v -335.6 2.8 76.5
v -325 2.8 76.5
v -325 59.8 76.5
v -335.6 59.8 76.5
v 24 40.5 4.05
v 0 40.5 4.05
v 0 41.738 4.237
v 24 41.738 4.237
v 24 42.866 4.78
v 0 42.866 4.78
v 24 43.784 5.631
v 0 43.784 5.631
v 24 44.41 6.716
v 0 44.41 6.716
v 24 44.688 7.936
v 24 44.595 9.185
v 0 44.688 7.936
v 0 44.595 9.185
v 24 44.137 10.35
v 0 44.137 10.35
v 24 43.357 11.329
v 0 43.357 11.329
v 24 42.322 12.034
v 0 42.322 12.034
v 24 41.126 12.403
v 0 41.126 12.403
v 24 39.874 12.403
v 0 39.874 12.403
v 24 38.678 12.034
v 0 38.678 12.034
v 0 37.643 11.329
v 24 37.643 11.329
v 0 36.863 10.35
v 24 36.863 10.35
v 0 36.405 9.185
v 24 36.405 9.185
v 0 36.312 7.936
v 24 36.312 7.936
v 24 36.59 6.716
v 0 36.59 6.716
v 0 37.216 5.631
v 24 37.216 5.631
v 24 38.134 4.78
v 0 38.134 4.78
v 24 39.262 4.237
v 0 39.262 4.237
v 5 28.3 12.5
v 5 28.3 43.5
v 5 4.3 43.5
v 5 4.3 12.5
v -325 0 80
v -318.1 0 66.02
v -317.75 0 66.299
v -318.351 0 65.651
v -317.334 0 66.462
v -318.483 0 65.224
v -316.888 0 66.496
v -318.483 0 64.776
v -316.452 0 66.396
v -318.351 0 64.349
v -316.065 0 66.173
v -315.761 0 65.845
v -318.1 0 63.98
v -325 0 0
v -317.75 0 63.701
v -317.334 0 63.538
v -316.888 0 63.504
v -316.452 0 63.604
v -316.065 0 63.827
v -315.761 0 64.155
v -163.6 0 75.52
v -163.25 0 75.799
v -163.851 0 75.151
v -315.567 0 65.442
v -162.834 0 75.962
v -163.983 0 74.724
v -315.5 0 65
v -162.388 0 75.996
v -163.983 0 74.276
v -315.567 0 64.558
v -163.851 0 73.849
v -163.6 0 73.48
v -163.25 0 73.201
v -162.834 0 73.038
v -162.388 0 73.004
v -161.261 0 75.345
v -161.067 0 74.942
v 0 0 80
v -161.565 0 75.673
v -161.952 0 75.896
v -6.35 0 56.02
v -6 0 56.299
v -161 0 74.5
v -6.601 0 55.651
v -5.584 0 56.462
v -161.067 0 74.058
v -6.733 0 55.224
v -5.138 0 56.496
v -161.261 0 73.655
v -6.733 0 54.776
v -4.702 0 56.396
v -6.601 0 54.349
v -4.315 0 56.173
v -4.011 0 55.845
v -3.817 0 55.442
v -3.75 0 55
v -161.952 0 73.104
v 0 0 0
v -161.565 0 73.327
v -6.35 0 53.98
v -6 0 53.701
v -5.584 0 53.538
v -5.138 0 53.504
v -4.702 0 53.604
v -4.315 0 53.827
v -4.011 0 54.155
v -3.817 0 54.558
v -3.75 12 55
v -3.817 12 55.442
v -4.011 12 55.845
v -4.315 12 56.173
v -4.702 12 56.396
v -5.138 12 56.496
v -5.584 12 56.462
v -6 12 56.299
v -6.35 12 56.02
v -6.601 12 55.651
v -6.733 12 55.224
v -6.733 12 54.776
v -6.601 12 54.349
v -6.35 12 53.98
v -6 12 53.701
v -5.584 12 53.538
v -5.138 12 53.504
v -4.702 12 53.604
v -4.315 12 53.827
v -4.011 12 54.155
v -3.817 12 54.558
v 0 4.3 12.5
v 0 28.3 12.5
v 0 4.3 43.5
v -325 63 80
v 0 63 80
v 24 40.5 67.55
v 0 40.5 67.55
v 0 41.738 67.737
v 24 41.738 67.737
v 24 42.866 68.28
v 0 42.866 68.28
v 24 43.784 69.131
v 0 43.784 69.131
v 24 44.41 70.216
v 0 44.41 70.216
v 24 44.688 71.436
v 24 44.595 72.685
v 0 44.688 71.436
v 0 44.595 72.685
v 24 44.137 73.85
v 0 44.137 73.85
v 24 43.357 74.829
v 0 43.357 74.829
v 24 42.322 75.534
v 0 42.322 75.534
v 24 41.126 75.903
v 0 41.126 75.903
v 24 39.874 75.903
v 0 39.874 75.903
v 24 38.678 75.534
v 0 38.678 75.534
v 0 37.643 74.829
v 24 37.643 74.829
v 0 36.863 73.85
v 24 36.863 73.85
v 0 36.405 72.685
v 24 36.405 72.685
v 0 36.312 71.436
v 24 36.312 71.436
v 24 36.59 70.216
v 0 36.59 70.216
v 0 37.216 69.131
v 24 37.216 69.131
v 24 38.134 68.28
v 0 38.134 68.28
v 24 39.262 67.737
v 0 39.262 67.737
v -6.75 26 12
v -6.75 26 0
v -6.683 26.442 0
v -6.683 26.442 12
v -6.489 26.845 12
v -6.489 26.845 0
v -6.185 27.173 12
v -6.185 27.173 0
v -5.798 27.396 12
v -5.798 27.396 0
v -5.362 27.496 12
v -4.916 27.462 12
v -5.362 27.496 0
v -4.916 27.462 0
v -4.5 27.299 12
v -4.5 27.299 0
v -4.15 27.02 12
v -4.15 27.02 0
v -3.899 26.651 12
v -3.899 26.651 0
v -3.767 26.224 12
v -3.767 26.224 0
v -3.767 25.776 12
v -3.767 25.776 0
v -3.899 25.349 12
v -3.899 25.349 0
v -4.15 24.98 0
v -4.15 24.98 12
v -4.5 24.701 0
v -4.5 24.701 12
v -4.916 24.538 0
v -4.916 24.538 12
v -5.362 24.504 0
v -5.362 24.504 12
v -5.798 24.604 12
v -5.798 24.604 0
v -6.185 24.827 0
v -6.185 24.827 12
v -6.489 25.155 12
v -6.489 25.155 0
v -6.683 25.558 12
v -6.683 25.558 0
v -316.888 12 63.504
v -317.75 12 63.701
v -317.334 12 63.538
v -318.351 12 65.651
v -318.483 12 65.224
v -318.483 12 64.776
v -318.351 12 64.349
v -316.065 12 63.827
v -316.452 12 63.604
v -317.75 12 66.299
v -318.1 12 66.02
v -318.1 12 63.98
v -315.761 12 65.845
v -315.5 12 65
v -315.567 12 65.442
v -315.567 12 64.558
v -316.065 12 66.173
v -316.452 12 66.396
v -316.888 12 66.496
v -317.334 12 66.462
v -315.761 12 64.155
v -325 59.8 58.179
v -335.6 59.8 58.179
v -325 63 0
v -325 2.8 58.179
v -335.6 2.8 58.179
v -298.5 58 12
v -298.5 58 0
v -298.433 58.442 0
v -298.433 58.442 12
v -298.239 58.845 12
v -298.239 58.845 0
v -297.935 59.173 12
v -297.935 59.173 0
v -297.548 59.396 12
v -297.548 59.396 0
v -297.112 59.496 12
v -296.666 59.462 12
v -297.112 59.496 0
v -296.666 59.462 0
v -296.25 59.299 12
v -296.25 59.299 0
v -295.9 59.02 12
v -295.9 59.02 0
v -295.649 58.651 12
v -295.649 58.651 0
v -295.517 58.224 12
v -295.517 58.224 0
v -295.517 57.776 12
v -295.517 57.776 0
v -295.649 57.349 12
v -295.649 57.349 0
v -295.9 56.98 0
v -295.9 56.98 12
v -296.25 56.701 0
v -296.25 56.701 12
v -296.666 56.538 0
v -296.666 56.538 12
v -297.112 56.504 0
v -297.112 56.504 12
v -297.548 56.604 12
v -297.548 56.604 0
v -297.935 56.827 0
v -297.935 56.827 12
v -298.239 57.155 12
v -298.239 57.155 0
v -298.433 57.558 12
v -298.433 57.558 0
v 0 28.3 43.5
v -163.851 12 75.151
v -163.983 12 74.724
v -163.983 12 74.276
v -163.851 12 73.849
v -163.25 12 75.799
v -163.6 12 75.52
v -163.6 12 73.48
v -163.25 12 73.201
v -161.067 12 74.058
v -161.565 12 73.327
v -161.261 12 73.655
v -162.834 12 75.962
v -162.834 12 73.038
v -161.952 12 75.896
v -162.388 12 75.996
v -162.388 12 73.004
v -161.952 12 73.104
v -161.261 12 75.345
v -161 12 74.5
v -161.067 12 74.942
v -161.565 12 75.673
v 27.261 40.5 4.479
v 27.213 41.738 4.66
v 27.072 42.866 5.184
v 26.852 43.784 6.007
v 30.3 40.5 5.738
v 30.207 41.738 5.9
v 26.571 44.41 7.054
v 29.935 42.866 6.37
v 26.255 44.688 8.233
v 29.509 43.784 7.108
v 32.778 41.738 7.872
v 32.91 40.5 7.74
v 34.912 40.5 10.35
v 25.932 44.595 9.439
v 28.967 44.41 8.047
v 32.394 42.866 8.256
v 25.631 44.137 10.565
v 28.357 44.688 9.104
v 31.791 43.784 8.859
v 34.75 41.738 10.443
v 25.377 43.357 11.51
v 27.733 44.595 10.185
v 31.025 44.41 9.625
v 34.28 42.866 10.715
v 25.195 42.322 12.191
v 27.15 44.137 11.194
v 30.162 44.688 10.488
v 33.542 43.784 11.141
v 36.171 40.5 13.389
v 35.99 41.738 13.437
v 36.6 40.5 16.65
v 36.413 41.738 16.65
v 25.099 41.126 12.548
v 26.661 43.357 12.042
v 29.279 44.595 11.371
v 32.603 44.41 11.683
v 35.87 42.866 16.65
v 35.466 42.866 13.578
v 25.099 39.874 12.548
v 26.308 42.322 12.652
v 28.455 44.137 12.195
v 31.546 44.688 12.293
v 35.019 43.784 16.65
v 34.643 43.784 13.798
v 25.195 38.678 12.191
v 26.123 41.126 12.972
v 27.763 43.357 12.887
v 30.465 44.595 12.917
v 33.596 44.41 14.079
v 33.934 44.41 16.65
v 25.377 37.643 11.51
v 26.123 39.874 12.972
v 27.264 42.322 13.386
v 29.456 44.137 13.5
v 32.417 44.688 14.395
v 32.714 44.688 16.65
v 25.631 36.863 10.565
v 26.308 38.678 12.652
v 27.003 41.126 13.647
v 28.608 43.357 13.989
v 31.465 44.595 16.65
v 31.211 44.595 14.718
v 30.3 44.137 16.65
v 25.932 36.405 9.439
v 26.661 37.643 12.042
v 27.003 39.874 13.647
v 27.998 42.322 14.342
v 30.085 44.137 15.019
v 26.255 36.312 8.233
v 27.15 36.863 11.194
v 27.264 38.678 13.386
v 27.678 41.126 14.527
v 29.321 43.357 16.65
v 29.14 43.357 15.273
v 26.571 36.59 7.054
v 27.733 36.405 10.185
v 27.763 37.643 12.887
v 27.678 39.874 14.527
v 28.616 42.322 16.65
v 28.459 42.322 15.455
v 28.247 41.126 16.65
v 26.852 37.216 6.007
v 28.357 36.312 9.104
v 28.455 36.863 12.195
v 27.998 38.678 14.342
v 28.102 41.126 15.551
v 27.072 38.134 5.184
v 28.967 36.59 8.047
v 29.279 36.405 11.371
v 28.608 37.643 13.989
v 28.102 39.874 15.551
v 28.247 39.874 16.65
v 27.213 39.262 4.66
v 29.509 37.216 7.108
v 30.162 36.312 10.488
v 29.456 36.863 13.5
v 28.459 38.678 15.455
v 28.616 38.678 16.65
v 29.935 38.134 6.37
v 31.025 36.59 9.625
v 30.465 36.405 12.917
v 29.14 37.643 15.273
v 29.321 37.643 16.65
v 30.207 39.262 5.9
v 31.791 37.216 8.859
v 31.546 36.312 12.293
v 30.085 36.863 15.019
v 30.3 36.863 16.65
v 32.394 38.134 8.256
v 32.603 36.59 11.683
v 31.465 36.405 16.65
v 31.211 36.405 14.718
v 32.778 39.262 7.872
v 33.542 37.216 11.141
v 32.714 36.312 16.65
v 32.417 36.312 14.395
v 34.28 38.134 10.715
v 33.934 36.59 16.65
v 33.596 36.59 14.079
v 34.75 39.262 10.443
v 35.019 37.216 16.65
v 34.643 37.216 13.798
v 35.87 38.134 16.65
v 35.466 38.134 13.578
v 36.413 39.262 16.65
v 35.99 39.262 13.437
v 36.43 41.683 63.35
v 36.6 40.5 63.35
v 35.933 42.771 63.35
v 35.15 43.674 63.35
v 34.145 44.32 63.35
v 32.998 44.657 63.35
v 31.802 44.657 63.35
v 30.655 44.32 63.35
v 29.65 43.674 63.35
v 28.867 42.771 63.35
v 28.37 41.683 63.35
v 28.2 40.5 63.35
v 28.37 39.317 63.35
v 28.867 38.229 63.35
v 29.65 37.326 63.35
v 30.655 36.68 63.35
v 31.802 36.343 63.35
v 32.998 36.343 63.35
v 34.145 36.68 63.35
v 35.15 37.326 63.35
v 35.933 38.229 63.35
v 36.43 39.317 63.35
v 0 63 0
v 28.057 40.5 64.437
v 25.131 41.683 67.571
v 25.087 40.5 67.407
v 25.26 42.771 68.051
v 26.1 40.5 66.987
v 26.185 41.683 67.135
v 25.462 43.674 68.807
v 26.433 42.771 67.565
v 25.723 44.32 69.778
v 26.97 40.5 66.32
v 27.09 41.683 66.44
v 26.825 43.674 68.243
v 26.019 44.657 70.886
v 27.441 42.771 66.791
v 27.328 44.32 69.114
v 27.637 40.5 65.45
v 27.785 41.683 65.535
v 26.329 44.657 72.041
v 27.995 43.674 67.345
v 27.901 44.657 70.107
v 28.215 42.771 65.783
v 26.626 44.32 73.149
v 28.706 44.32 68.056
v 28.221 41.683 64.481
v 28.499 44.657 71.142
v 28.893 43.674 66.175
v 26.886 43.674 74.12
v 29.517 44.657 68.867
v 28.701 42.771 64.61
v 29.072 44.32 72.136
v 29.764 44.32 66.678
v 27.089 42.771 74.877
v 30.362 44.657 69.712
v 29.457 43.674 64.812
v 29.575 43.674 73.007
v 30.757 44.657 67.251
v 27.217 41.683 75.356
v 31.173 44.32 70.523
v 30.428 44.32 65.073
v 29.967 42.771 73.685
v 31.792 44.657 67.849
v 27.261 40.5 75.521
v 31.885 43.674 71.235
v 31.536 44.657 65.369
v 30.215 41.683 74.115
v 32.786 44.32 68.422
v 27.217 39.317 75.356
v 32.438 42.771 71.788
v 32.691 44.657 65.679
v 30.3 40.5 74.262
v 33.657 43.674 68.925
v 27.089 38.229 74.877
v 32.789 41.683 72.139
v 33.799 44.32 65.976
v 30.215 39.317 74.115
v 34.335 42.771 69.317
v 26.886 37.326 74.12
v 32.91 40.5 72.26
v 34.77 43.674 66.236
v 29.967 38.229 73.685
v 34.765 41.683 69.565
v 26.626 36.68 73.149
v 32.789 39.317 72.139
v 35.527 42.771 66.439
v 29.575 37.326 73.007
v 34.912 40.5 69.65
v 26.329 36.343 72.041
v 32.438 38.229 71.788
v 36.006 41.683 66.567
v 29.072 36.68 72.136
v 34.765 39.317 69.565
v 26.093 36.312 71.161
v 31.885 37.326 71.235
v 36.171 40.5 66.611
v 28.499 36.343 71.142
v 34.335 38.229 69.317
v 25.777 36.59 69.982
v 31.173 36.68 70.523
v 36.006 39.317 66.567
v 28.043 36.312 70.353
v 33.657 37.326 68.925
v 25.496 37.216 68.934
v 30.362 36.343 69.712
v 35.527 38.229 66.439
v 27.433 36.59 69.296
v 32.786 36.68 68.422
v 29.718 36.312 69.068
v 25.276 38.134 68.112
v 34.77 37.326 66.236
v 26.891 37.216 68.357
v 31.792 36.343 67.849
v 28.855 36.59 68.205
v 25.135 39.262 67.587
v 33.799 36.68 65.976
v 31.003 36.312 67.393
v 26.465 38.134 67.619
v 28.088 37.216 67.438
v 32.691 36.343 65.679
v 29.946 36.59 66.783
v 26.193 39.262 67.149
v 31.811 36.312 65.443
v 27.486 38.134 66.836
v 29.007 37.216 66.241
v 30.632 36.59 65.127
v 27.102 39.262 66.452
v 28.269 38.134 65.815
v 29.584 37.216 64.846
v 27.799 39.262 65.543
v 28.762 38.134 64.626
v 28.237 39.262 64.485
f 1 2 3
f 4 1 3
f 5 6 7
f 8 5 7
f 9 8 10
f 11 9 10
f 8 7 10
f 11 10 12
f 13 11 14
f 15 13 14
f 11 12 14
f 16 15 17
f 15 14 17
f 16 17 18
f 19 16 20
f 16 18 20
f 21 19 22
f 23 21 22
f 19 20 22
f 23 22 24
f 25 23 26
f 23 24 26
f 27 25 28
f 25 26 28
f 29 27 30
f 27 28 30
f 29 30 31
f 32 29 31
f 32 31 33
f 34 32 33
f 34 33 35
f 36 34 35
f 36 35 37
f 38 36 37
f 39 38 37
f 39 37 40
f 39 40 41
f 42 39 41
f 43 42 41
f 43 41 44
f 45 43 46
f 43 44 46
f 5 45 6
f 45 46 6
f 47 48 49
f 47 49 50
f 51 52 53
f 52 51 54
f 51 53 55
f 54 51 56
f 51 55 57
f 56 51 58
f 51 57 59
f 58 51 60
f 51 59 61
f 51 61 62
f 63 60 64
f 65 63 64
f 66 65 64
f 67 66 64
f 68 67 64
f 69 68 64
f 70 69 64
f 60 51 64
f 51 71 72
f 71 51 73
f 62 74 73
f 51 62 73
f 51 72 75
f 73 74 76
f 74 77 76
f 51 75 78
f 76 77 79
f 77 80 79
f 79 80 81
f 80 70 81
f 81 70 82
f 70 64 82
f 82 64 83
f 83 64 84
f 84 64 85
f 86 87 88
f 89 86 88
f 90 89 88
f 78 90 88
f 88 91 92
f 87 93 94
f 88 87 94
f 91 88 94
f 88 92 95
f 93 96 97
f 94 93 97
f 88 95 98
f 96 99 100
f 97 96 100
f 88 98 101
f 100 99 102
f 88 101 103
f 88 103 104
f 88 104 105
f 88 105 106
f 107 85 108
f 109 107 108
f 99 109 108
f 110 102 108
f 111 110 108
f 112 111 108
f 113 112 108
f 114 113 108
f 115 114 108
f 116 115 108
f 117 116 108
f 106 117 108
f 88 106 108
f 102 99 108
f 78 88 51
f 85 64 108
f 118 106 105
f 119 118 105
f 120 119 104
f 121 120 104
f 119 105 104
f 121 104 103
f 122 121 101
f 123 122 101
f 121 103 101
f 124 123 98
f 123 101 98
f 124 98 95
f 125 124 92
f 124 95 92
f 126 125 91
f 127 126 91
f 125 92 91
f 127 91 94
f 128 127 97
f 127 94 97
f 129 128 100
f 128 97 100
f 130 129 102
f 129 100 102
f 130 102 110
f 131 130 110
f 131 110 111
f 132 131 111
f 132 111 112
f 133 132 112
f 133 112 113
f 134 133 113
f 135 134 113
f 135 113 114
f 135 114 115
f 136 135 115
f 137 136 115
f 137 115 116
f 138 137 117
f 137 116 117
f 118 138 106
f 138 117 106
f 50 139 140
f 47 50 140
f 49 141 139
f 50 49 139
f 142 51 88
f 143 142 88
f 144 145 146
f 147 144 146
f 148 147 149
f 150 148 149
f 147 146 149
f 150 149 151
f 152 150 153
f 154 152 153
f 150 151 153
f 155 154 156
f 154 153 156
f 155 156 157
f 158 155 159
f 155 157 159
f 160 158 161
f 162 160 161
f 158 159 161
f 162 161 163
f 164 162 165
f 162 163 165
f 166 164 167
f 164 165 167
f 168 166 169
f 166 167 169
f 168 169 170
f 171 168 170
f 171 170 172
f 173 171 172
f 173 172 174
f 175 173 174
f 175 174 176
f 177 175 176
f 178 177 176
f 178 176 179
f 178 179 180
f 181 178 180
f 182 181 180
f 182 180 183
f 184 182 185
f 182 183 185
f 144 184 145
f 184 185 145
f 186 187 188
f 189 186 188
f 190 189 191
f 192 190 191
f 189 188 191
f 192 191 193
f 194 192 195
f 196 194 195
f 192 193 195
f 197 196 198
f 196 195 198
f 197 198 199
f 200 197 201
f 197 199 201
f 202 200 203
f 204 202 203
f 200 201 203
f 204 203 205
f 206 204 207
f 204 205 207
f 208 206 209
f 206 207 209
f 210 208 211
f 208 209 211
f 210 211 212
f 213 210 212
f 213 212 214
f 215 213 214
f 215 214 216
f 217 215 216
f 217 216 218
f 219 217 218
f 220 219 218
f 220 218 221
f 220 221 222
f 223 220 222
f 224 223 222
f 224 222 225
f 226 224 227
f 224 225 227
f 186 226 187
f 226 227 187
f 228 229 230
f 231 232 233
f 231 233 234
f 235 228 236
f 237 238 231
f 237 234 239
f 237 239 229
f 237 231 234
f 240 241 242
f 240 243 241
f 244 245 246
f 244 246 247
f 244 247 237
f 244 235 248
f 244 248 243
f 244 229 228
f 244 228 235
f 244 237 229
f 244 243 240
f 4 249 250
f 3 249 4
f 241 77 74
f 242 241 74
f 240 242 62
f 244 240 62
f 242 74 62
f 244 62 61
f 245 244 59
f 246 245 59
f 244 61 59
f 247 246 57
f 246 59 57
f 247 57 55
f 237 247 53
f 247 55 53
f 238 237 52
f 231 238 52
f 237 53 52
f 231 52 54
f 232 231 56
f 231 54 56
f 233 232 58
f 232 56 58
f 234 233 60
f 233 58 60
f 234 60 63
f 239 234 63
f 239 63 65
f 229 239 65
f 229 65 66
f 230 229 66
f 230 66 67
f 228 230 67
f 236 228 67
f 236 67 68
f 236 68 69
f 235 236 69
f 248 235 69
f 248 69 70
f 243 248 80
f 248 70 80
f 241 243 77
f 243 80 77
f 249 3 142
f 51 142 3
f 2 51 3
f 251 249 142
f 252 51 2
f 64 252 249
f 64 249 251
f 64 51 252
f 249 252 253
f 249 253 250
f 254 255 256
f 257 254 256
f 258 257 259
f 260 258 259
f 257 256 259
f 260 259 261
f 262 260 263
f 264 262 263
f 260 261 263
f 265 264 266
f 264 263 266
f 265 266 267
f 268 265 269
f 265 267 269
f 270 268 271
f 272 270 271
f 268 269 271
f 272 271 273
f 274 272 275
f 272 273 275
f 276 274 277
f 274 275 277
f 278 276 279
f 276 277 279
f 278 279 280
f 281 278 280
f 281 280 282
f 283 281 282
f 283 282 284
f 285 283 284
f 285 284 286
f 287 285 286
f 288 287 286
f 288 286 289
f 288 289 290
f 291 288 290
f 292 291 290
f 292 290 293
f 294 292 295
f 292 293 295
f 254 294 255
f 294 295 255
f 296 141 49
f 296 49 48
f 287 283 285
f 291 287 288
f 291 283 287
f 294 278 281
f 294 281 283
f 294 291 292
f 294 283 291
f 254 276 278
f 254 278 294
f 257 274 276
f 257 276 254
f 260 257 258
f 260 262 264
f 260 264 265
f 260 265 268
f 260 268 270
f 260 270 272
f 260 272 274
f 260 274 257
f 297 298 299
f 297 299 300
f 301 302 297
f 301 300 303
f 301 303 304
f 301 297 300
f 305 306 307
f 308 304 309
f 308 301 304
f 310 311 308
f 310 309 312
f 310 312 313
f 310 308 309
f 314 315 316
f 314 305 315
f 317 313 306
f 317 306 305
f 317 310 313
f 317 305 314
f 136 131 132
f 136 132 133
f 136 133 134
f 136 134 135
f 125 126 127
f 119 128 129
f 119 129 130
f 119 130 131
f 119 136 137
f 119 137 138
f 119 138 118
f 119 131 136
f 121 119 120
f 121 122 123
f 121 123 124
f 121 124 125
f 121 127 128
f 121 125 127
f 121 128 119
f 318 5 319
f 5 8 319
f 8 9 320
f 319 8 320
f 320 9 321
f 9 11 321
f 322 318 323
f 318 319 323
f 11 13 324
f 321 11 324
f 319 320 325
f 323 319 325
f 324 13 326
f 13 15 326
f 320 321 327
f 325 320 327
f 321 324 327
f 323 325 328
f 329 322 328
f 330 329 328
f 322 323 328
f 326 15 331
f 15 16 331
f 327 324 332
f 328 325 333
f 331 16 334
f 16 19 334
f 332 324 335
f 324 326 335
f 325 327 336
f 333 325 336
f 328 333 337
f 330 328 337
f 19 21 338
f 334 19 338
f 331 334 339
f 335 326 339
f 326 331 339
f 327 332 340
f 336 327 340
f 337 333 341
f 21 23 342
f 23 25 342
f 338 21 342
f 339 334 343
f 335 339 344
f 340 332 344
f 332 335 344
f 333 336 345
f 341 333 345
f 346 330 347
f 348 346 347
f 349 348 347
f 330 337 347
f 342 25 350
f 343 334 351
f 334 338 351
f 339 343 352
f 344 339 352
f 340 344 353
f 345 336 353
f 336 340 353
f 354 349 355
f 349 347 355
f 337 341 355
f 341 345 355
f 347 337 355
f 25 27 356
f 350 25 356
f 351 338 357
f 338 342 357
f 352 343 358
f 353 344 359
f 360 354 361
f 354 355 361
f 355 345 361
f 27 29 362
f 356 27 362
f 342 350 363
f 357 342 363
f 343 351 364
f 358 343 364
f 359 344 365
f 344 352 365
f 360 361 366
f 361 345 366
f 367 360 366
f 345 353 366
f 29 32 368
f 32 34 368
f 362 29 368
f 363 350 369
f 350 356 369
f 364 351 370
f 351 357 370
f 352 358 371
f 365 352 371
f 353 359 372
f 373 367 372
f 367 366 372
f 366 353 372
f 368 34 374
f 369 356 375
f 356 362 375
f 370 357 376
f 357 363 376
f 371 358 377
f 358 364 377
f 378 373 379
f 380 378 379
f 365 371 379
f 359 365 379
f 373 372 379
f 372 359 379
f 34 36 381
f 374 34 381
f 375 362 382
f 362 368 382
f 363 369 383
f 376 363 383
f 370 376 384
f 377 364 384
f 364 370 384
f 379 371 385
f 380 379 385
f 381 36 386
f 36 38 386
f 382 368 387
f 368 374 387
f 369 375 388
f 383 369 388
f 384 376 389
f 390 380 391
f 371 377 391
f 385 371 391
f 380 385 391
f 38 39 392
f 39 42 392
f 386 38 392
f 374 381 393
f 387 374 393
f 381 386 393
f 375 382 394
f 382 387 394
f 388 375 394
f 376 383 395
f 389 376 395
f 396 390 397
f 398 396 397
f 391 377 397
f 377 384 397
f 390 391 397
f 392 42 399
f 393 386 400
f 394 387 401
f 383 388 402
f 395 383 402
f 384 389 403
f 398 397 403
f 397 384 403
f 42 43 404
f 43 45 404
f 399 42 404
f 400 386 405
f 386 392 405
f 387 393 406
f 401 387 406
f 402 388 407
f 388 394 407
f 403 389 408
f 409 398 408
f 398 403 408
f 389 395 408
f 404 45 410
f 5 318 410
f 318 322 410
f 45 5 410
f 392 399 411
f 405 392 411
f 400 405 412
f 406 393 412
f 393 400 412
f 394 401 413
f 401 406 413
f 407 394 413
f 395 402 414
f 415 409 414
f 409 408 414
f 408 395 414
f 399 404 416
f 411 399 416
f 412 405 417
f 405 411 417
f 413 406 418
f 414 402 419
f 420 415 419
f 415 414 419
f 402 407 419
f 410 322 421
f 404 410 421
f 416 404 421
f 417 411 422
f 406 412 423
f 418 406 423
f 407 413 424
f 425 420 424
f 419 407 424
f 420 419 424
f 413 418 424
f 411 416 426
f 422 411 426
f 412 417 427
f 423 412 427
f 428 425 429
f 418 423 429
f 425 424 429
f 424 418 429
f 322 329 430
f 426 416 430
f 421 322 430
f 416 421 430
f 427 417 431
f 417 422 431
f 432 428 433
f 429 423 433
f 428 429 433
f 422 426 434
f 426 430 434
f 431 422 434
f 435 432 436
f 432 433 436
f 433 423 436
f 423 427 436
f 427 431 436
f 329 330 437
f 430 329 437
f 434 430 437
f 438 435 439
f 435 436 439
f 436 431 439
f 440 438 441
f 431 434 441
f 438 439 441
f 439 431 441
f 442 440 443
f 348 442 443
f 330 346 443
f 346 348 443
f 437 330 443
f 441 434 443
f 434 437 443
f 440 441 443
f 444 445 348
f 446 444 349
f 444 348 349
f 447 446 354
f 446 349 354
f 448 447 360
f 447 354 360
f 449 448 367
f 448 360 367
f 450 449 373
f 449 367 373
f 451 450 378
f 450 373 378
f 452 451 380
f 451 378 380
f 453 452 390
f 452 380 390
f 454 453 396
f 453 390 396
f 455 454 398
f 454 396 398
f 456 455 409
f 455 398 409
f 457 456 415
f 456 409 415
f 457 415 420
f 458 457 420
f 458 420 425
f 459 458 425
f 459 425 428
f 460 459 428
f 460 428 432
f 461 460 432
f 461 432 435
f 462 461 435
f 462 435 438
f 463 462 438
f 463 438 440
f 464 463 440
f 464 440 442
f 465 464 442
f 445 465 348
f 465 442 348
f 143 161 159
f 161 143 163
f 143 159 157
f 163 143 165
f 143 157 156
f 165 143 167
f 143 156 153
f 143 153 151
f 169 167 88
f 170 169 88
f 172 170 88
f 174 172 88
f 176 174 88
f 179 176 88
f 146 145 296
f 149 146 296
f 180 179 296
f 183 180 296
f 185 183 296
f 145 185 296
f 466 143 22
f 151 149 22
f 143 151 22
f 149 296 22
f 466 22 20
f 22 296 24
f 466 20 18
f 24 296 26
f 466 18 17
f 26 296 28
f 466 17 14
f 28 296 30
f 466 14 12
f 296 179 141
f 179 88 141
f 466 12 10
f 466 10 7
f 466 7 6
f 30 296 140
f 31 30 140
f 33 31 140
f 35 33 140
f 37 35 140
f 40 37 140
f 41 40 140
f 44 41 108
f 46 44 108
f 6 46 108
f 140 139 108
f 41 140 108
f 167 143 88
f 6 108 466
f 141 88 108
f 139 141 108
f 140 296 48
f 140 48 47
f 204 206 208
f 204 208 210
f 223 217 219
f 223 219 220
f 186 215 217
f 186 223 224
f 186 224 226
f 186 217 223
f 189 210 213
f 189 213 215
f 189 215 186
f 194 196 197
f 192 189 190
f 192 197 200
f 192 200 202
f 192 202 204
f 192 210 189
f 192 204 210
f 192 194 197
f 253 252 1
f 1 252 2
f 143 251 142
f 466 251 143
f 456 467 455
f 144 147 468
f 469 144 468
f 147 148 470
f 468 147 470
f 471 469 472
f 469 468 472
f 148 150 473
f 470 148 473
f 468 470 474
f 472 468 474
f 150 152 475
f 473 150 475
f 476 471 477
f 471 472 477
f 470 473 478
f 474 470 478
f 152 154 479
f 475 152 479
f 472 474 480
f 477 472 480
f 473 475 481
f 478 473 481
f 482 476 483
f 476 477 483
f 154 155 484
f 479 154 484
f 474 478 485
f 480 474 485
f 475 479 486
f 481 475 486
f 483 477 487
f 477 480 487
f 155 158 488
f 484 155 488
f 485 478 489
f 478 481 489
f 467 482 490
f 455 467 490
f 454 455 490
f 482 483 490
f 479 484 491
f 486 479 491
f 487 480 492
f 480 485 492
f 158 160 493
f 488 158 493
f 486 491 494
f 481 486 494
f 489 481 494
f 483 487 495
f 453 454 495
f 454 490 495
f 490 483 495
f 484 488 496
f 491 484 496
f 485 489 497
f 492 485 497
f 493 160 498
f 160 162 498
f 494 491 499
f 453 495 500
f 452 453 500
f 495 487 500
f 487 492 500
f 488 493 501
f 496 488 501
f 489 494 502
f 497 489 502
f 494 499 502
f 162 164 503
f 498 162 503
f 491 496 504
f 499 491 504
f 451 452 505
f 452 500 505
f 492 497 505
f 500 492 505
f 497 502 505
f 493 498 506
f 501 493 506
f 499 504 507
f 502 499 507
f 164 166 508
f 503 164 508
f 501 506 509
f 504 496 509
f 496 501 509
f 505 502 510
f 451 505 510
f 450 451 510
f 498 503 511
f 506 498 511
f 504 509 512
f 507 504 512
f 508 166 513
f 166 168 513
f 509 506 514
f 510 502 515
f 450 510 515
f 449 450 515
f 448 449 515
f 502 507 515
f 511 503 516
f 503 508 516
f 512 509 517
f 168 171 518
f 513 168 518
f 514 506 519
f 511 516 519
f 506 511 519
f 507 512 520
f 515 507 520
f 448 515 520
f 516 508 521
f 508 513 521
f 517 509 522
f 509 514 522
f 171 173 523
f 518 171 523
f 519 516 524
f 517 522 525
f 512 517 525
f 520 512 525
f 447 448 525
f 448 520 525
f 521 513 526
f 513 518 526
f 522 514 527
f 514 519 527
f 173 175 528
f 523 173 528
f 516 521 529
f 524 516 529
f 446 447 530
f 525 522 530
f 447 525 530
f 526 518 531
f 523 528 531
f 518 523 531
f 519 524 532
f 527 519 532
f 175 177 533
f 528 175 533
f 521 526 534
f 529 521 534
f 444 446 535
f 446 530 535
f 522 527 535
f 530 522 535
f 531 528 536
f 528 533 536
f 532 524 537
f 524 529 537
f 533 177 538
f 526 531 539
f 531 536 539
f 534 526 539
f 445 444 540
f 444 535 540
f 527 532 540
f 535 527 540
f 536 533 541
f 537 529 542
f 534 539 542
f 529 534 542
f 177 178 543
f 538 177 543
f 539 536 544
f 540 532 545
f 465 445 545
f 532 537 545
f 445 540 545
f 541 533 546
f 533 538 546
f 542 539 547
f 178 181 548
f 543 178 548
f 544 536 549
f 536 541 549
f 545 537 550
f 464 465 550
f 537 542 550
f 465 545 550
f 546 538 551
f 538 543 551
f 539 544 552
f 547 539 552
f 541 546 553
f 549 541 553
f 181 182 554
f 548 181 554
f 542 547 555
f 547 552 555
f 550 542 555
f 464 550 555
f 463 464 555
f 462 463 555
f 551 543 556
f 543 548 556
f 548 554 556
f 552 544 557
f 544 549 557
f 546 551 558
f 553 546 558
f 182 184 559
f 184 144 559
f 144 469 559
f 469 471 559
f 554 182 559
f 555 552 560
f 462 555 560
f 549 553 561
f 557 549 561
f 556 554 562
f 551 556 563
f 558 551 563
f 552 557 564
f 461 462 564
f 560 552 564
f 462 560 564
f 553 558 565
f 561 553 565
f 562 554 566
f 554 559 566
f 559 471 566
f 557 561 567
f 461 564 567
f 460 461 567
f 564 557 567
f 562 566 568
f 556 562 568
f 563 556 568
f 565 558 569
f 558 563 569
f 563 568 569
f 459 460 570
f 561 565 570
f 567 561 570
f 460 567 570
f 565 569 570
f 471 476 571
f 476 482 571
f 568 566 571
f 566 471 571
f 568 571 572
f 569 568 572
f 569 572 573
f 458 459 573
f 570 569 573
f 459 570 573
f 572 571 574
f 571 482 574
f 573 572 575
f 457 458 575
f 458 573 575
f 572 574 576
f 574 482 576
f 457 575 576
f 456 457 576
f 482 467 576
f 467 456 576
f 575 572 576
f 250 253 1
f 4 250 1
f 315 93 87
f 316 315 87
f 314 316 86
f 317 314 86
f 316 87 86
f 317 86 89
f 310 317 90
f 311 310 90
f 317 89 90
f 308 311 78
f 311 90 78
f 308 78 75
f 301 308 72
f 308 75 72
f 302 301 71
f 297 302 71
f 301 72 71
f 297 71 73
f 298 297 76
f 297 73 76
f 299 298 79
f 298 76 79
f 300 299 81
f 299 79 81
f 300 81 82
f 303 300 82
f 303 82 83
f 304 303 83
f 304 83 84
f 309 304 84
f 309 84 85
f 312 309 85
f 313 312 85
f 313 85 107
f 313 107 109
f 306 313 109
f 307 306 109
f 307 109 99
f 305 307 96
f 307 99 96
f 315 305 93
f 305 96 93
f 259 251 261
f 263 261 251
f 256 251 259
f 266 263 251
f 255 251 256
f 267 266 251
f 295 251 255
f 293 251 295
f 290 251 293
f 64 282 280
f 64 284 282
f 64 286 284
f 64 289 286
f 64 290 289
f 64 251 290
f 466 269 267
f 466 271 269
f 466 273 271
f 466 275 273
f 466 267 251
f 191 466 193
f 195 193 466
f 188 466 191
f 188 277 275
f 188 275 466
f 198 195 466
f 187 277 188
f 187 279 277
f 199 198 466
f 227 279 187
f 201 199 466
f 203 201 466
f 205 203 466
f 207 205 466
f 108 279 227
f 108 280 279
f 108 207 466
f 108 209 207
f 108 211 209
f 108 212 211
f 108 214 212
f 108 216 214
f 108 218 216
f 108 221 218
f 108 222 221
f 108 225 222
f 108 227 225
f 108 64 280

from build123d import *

# Parameters (mm, degrees)
SKETCH1_W           = 325
SKETCH1_H           = 80
BOSS_EXTRUDE1_DEPTH = 63
SKETCH2_R           = 4.2
BOSS_EXTRUDE2_DEPTH = 24
SKETCH3_R           = 4.2
REVOLVE1_ANGLE      = 90
SKETCH4_R           = 4.2
REVOLVE2_ANGLE      = 90
SKETCH5_R           = 4.2
BOSS_EXTRUDE3_DEPTH = 46.7
SKETCH6_W           = 31
SKETCH6_H           = 24
BOSS_EXTRUDE4_DEPTH = 5
SKETCH7_W           = 18.321036957
SKETCH7_H           = 57
BOSS_EXTRUDE5_DEPTH = 10.6
SKETCH8_R           = 1.5
CUT_EXTRUDE1_DEPTH  = 12
SKETCH9_R           = 1.5
CUT_EXTRUDE3_DEPTH  = 12


with BuildPart() as part:
    # Sketch1 → Boss-Extrude1 (new body)
    with BuildSketch(Plane(origin=(0, 0, 0), x_dir=(1, 0, 0), z_dir=(0, 1, 0))):
        with Locations((-162.5, -40)):
            Rectangle(SKETCH1_W, SKETCH1_H)
    extrude(amount=BOSS_EXTRUDE1_DEPTH)

    # Sketch2 → Boss-Extrude2 (add)
    with BuildSketch(Plane(origin=(0, 0, 0), x_dir=(0, 0, -1), z_dir=(1, 0, 0))):
        with Locations((-71.75, 40.5)):
            Circle(SKETCH2_R)
        with Locations((-8.25, 40.5)):
            Circle(SKETCH2_R)
    extrude(amount=BOSS_EXTRUDE2_DEPTH)

    # Sketch3 → Revolve1 (revolve)
    with BuildSketch(Plane(origin=(24, 0, 0), x_dir=(0, 0, -1), z_dir=(1, 0, 0))):
        with Locations((-71.75, 40.5)):
            Circle(SKETCH3_R)
    revolve(axis=Axis((24, 40.5, 63.35), (0, 1, 0)), revolution_arc=REVOLVE1_ANGLE)

    # Sketch4 → Revolve2 (revolve)
    with BuildSketch(Plane(origin=(24, 0, 0), x_dir=(0, 0, -1), z_dir=(1, 0, 0))):
        with Locations((-8.25, 40.5)):
            Circle(SKETCH4_R)
    revolve(axis=Axis((24, 40.5, 16.65), (0, -1, 0)), revolution_arc=REVOLVE2_ANGLE)

    # Sketch5 → Boss-Extrude3 (add)
    with BuildSketch(Plane.XY.offset(16.65)):
        with Locations((32.4, 40.5)):
            Circle(SKETCH5_R)
    extrude(amount=BOSS_EXTRUDE3_DEPTH)

    # Sketch6 → Boss-Extrude4 (add)
    with BuildSketch(Plane(origin=(0, 0, 0), x_dir=(0, 0, -1), z_dir=(1, 0, 0))):
        with Locations((-28, 16.3)):
            Rectangle(SKETCH6_W, SKETCH6_H)
    extrude(amount=BOSS_EXTRUDE4_DEPTH)

    # Sketch7 → Boss-Extrude5 (add)
    with BuildSketch(Plane.ZY.offset(325)):
        with Locations((67.339481522, 31.3)):
            Rectangle(SKETCH7_W, SKETCH7_H)
    extrude(amount=BOSS_EXTRUDE5_DEPTH)

    # Sketch8 → Cut-Extrude1 (cut)
    with BuildSketch(Plane.XZ):
        with Locations((-317, 65)):
            Circle(SKETCH8_R)
        with Locations((-162.5, 74.5)):
            Circle(SKETCH8_R)
        with Locations((-5.25, 55)):
            Circle(SKETCH8_R)
    extrude(amount=-CUT_EXTRUDE1_DEPTH, mode=Mode.SUBTRACT)

    # Sketch9 → Cut-Extrude3 (cut)
    with BuildSketch(Plane(origin=(0, 0, 0), x_dir=(-1, 0, 0), z_dir=(0, 0, -1))):
        with Locations((5.25, 26)):
            Circle(SKETCH9_R)
        with Locations((297, 58)):
            Circle(SKETCH9_R)
    extrude(amount=-CUT_EXTRUDE3_DEPTH, mode=Mode.SUBTRACT)


solid = part.part
